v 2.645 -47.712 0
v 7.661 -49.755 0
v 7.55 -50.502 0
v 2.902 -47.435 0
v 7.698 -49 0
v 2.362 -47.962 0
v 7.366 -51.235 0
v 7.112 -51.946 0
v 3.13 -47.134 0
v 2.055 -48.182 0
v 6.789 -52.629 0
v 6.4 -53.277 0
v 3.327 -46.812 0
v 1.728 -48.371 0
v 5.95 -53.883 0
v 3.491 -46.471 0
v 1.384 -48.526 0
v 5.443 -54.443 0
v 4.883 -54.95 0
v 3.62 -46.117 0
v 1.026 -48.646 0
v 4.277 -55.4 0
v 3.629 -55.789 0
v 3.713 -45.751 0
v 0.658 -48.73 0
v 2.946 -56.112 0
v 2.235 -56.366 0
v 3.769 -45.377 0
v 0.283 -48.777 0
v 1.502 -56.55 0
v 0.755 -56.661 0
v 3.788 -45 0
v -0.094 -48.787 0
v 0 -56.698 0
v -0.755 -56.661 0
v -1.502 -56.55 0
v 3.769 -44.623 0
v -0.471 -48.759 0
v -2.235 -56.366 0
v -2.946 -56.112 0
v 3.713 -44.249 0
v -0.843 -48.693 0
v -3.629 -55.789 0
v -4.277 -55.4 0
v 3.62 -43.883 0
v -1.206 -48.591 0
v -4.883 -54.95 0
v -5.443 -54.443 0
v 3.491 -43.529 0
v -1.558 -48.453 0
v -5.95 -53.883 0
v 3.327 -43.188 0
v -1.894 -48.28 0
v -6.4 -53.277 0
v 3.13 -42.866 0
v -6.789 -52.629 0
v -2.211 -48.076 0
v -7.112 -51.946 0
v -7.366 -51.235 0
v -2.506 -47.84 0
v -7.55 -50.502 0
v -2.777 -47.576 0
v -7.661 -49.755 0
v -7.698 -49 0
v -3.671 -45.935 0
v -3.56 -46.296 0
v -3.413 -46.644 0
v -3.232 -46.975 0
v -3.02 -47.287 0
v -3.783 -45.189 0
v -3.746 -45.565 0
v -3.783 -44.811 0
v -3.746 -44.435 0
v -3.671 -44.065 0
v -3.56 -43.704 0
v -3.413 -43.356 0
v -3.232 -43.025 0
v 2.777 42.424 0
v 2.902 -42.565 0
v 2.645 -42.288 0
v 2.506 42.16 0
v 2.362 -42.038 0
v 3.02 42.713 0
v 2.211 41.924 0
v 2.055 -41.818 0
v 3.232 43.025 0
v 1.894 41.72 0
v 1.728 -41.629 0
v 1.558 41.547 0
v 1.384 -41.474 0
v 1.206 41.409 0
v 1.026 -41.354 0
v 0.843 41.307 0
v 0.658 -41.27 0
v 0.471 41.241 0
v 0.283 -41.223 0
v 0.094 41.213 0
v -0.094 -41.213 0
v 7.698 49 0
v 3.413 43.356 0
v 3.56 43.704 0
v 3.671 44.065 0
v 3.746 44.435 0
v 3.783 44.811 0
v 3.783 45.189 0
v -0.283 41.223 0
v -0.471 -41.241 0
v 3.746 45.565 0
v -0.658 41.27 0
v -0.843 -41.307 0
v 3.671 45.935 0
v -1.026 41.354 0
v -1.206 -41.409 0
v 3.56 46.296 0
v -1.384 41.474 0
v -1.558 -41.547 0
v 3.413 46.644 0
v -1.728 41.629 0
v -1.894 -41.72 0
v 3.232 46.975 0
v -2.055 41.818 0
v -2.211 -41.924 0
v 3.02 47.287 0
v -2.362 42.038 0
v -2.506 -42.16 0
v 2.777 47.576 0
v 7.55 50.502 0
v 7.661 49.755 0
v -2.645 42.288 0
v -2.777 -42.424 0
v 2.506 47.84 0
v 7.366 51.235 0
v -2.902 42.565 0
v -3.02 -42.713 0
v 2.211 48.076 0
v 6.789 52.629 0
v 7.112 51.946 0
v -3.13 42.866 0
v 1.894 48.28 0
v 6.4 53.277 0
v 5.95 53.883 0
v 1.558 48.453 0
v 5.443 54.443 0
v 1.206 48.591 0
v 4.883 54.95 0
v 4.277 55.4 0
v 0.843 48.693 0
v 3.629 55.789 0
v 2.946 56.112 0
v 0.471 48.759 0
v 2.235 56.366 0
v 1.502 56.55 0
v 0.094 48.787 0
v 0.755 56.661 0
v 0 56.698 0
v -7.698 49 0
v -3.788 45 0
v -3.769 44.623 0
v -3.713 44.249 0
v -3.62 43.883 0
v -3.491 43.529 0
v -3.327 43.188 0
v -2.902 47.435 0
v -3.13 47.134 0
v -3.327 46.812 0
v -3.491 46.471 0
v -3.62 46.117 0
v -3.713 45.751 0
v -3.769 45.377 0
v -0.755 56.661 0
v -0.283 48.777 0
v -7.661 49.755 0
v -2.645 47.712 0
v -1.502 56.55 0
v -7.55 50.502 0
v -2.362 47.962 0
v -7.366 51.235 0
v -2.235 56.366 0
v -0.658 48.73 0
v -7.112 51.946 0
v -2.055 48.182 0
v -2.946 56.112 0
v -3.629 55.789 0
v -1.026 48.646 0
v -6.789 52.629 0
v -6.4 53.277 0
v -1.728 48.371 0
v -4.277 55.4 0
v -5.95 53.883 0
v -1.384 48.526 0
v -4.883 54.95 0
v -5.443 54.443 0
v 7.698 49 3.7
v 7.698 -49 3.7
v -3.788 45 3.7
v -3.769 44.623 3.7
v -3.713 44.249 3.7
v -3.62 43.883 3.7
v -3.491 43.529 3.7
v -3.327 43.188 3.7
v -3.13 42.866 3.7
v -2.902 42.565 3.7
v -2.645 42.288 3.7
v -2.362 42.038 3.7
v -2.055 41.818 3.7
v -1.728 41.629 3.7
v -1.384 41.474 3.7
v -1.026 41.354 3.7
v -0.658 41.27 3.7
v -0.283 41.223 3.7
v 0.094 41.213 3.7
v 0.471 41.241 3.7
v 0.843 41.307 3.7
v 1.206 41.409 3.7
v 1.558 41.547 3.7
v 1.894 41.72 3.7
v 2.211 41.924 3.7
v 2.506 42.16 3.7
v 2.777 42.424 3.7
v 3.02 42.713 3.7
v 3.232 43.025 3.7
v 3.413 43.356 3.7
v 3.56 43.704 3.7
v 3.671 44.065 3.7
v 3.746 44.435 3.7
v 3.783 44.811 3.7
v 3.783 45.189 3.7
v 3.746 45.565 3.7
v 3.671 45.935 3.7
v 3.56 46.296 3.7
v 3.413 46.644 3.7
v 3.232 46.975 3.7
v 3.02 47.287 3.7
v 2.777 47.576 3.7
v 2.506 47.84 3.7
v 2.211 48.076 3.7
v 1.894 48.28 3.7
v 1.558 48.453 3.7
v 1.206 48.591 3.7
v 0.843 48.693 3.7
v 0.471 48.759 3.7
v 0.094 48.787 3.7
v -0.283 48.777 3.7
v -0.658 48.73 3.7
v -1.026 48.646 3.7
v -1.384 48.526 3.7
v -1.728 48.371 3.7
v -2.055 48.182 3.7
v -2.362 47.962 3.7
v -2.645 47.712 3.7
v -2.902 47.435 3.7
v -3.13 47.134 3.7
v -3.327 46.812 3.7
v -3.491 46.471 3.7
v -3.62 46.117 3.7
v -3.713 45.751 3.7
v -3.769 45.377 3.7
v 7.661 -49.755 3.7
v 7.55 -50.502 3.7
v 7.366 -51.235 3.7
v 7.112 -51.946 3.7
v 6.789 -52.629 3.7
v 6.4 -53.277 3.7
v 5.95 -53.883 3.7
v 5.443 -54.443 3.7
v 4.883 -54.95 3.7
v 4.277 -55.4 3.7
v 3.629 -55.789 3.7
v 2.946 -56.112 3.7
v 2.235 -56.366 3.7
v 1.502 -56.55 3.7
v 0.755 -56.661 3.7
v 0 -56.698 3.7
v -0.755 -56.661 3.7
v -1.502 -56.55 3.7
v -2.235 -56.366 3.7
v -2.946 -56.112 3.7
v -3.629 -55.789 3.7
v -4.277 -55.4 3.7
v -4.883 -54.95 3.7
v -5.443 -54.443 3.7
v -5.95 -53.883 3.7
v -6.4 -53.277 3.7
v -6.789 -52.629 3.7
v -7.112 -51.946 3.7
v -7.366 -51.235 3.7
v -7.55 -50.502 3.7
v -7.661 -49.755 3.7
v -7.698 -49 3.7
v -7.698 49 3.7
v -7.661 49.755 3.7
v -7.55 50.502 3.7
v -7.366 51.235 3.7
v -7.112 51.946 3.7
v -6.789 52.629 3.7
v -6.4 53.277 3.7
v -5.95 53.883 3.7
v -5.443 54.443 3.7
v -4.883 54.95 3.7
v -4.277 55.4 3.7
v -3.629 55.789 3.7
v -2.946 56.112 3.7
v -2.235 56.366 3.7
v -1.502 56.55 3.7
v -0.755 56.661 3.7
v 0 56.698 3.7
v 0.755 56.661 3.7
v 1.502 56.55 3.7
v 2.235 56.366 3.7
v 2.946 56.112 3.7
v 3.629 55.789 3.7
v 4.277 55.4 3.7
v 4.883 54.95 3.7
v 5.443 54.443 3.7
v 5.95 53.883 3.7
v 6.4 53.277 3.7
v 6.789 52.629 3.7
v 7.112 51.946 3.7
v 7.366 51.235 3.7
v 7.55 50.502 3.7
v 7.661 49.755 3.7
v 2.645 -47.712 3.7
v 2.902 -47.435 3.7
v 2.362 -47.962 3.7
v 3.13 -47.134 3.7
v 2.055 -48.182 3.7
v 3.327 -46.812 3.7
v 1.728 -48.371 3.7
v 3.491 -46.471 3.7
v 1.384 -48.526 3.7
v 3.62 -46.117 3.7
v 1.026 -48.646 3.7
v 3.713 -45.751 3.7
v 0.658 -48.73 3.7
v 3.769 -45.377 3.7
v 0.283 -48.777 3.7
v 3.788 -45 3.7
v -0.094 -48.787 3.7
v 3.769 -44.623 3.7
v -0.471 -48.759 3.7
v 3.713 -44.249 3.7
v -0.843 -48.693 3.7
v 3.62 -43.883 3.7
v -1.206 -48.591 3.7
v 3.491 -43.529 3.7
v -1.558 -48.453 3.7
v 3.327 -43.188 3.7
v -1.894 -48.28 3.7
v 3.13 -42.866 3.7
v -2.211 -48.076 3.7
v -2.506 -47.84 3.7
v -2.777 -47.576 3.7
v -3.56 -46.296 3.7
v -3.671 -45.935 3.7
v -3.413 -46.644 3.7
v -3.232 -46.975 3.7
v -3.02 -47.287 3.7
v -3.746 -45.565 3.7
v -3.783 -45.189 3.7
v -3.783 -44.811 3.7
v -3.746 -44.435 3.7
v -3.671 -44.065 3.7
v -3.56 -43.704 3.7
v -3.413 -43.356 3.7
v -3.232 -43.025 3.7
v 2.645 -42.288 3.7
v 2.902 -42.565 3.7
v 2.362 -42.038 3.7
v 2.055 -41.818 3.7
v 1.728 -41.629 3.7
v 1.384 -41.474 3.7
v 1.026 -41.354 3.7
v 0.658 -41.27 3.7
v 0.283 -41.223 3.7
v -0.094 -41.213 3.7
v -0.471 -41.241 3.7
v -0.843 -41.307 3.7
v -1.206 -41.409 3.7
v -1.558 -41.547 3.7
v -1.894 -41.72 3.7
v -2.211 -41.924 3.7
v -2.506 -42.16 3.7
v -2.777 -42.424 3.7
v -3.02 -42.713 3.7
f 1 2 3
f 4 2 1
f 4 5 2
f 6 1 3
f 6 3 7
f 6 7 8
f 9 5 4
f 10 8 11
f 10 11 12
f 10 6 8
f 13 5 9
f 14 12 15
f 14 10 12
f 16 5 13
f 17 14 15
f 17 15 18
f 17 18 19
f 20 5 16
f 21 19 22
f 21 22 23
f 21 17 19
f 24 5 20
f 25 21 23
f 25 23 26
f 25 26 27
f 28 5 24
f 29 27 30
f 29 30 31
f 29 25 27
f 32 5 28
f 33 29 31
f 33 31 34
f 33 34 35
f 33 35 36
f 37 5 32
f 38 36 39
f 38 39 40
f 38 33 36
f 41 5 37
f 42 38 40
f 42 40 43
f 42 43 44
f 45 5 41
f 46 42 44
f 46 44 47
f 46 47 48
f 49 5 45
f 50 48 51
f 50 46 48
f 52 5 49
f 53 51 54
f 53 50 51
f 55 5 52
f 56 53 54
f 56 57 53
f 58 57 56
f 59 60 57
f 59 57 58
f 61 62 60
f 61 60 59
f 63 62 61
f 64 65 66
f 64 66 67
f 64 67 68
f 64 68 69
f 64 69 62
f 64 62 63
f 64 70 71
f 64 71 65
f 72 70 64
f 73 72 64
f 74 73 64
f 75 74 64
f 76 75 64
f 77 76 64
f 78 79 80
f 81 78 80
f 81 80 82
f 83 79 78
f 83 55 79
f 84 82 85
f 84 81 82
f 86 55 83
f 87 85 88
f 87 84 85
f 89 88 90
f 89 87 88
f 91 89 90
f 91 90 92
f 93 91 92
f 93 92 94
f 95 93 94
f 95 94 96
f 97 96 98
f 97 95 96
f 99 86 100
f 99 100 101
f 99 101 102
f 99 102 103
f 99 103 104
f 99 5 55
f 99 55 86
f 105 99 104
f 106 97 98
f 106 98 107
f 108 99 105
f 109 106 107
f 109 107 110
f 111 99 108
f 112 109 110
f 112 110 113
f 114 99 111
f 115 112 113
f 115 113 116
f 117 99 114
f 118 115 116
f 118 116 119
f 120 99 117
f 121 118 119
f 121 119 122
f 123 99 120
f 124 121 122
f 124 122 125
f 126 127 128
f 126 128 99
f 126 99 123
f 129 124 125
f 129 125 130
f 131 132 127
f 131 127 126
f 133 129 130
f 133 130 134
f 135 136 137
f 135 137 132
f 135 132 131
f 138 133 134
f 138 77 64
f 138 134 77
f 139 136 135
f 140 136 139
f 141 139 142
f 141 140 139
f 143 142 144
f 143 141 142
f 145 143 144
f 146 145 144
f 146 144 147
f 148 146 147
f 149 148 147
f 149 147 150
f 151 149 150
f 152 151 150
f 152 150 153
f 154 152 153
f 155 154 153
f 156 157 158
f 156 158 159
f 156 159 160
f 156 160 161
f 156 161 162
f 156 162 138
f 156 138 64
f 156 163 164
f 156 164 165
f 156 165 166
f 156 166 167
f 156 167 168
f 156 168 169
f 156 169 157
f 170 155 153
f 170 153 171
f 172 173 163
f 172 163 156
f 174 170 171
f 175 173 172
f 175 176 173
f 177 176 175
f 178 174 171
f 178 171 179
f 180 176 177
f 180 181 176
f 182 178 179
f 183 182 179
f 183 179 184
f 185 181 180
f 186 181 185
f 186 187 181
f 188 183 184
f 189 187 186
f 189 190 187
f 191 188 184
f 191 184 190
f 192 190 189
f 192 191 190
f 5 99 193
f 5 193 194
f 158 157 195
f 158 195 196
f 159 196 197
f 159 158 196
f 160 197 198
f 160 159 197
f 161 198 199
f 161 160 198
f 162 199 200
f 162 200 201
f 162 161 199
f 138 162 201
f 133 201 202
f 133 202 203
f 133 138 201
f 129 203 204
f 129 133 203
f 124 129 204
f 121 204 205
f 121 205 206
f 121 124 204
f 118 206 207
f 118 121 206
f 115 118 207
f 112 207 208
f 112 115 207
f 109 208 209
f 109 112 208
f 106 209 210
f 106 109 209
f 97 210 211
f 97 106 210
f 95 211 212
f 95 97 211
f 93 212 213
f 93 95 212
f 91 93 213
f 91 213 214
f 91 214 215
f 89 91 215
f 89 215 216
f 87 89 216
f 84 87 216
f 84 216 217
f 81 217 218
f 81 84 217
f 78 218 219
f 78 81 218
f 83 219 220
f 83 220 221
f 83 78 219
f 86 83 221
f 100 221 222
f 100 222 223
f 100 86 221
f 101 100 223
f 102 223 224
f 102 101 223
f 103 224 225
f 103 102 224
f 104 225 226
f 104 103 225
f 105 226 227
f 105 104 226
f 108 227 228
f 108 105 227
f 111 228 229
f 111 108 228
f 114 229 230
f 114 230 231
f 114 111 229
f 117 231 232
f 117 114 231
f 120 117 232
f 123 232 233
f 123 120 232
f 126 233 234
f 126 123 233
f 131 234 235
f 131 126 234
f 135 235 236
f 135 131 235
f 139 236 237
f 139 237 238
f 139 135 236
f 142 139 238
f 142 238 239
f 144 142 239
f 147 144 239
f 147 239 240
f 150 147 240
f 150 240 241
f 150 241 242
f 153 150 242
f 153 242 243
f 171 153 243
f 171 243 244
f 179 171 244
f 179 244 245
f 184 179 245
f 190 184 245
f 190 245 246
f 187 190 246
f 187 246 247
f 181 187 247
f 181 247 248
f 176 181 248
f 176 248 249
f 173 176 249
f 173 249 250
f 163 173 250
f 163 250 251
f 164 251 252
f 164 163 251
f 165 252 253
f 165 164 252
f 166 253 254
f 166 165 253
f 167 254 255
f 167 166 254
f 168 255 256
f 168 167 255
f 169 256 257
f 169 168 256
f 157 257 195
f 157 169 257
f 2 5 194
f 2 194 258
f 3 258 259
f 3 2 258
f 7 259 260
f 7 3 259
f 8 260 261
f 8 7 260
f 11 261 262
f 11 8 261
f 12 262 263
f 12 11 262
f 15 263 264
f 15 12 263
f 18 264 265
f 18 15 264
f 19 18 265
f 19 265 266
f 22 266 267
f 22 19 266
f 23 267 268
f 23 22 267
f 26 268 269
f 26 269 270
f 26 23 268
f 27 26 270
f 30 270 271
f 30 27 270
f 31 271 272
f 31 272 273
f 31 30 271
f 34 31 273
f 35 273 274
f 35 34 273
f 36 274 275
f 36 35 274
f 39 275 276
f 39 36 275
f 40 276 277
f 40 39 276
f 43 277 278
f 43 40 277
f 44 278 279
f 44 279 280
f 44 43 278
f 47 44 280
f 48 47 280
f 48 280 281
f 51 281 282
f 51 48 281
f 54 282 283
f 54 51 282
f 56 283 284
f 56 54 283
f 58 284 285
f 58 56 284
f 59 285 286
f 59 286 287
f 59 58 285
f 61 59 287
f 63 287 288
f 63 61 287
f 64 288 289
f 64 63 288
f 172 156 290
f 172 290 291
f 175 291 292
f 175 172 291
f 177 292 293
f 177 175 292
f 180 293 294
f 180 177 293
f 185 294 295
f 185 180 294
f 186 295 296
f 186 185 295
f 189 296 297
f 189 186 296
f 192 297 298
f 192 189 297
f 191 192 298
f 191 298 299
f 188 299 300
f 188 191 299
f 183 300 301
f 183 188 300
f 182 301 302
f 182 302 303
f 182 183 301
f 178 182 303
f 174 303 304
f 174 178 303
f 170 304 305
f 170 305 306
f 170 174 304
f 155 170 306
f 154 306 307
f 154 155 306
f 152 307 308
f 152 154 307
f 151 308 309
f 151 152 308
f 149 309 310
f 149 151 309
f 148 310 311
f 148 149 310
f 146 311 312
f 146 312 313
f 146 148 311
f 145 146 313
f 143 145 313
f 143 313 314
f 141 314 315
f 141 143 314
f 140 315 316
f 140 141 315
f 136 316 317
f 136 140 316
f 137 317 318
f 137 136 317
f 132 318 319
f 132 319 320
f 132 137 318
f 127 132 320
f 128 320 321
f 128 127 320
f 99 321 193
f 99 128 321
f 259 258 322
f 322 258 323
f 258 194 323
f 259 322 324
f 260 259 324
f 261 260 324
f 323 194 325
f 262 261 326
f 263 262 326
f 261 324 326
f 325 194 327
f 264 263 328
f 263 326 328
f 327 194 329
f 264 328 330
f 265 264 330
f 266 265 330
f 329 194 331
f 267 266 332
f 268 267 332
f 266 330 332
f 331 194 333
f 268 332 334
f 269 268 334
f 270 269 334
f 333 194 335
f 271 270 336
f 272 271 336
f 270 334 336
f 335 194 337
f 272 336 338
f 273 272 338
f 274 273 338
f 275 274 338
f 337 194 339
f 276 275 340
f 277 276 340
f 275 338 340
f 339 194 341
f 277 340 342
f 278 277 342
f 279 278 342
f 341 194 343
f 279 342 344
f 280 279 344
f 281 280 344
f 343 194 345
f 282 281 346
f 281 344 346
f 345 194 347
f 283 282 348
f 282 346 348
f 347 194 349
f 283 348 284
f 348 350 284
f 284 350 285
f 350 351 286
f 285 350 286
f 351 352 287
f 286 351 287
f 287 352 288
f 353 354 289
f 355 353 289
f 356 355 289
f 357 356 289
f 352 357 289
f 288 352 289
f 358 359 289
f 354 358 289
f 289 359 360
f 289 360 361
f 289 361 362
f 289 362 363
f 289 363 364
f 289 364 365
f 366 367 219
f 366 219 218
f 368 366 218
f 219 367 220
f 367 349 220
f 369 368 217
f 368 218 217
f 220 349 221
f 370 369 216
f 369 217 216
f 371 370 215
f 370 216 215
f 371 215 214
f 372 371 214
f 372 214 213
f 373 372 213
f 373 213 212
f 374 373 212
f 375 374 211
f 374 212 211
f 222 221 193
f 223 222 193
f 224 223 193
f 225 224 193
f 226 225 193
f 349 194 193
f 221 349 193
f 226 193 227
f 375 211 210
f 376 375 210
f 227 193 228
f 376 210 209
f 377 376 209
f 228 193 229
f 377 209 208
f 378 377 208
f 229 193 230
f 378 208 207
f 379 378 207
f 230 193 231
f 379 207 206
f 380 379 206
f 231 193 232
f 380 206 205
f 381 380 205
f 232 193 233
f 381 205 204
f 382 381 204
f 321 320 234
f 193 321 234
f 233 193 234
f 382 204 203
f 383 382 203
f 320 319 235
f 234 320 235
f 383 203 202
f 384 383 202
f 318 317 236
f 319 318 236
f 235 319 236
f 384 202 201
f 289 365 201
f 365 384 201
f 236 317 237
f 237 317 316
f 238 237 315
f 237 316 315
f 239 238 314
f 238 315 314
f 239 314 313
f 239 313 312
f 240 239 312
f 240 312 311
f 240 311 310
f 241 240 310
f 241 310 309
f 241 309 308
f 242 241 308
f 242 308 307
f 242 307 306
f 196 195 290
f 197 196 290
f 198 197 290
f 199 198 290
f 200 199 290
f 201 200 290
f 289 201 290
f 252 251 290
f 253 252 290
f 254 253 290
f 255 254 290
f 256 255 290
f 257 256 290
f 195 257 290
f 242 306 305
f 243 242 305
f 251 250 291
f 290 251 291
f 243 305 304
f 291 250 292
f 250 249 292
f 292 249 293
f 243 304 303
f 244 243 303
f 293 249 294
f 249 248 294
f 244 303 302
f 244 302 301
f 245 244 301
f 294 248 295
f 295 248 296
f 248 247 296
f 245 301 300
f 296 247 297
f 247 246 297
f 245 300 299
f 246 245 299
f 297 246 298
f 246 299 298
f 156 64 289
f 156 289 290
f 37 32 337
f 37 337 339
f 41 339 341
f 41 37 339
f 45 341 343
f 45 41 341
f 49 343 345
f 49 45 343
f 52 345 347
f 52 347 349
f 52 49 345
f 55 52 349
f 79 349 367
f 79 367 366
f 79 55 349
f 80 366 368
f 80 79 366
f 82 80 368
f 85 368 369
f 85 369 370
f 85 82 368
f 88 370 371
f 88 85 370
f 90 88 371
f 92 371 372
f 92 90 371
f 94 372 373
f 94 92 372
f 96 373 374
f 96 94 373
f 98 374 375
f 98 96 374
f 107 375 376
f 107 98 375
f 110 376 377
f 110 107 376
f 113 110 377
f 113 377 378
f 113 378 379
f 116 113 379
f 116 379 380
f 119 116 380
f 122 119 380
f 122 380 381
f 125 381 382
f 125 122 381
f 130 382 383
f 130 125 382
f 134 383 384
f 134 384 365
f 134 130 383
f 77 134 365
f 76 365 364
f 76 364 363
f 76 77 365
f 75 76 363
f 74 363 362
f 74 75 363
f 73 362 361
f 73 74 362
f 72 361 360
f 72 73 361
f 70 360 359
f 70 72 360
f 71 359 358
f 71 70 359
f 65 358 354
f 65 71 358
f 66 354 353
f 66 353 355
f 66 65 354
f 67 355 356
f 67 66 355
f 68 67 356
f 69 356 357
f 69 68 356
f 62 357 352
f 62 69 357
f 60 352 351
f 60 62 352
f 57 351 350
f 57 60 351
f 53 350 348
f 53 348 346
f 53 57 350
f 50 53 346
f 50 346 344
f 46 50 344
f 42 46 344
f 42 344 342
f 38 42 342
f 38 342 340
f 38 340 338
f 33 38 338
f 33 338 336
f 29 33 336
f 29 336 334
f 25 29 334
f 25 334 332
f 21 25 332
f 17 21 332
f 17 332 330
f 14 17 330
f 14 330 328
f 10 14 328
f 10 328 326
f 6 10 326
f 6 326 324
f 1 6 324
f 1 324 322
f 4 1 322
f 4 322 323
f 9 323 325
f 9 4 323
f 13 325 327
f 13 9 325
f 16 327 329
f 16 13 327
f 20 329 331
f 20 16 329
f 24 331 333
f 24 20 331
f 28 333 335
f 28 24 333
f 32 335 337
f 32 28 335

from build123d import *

# Parameters (mm, degrees)
IZIM1_R                     = 3.787969925
Y_KSEKLIK_EKSTR_ZYON1_DEPTH = 3.7


with BuildPart() as part:
    # Çizim1 → Yükseklik-Ekstrüzyon1 (new body)
    with BuildSketch(Plane.XY):
        with BuildLine():
            Line((-7.697744361, -49), (-7.697744361, 49))
            ThreePointArc((-7.697744361, 49), (0, 56.697744361), (7.697744361, 49))
            Line((7.697744361, 49), (7.697744361, -49))
            ThreePointArc((7.697744361, -49), (0, -56.697744361), (-7.697744361, -49))
        make_face()
        with Locations((0, -45)):
            Circle(IZIM1_R, mode=Mode.SUBTRACT)
        with Locations(Location((0, 45, 0), (0, 0, 180))):
            Circle(IZIM1_R, mode=Mode.SUBTRACT)
    extrude(amount=Y_KSEKLIK_EKSTR_ZYON1_DEPTH)


solid = part.part
